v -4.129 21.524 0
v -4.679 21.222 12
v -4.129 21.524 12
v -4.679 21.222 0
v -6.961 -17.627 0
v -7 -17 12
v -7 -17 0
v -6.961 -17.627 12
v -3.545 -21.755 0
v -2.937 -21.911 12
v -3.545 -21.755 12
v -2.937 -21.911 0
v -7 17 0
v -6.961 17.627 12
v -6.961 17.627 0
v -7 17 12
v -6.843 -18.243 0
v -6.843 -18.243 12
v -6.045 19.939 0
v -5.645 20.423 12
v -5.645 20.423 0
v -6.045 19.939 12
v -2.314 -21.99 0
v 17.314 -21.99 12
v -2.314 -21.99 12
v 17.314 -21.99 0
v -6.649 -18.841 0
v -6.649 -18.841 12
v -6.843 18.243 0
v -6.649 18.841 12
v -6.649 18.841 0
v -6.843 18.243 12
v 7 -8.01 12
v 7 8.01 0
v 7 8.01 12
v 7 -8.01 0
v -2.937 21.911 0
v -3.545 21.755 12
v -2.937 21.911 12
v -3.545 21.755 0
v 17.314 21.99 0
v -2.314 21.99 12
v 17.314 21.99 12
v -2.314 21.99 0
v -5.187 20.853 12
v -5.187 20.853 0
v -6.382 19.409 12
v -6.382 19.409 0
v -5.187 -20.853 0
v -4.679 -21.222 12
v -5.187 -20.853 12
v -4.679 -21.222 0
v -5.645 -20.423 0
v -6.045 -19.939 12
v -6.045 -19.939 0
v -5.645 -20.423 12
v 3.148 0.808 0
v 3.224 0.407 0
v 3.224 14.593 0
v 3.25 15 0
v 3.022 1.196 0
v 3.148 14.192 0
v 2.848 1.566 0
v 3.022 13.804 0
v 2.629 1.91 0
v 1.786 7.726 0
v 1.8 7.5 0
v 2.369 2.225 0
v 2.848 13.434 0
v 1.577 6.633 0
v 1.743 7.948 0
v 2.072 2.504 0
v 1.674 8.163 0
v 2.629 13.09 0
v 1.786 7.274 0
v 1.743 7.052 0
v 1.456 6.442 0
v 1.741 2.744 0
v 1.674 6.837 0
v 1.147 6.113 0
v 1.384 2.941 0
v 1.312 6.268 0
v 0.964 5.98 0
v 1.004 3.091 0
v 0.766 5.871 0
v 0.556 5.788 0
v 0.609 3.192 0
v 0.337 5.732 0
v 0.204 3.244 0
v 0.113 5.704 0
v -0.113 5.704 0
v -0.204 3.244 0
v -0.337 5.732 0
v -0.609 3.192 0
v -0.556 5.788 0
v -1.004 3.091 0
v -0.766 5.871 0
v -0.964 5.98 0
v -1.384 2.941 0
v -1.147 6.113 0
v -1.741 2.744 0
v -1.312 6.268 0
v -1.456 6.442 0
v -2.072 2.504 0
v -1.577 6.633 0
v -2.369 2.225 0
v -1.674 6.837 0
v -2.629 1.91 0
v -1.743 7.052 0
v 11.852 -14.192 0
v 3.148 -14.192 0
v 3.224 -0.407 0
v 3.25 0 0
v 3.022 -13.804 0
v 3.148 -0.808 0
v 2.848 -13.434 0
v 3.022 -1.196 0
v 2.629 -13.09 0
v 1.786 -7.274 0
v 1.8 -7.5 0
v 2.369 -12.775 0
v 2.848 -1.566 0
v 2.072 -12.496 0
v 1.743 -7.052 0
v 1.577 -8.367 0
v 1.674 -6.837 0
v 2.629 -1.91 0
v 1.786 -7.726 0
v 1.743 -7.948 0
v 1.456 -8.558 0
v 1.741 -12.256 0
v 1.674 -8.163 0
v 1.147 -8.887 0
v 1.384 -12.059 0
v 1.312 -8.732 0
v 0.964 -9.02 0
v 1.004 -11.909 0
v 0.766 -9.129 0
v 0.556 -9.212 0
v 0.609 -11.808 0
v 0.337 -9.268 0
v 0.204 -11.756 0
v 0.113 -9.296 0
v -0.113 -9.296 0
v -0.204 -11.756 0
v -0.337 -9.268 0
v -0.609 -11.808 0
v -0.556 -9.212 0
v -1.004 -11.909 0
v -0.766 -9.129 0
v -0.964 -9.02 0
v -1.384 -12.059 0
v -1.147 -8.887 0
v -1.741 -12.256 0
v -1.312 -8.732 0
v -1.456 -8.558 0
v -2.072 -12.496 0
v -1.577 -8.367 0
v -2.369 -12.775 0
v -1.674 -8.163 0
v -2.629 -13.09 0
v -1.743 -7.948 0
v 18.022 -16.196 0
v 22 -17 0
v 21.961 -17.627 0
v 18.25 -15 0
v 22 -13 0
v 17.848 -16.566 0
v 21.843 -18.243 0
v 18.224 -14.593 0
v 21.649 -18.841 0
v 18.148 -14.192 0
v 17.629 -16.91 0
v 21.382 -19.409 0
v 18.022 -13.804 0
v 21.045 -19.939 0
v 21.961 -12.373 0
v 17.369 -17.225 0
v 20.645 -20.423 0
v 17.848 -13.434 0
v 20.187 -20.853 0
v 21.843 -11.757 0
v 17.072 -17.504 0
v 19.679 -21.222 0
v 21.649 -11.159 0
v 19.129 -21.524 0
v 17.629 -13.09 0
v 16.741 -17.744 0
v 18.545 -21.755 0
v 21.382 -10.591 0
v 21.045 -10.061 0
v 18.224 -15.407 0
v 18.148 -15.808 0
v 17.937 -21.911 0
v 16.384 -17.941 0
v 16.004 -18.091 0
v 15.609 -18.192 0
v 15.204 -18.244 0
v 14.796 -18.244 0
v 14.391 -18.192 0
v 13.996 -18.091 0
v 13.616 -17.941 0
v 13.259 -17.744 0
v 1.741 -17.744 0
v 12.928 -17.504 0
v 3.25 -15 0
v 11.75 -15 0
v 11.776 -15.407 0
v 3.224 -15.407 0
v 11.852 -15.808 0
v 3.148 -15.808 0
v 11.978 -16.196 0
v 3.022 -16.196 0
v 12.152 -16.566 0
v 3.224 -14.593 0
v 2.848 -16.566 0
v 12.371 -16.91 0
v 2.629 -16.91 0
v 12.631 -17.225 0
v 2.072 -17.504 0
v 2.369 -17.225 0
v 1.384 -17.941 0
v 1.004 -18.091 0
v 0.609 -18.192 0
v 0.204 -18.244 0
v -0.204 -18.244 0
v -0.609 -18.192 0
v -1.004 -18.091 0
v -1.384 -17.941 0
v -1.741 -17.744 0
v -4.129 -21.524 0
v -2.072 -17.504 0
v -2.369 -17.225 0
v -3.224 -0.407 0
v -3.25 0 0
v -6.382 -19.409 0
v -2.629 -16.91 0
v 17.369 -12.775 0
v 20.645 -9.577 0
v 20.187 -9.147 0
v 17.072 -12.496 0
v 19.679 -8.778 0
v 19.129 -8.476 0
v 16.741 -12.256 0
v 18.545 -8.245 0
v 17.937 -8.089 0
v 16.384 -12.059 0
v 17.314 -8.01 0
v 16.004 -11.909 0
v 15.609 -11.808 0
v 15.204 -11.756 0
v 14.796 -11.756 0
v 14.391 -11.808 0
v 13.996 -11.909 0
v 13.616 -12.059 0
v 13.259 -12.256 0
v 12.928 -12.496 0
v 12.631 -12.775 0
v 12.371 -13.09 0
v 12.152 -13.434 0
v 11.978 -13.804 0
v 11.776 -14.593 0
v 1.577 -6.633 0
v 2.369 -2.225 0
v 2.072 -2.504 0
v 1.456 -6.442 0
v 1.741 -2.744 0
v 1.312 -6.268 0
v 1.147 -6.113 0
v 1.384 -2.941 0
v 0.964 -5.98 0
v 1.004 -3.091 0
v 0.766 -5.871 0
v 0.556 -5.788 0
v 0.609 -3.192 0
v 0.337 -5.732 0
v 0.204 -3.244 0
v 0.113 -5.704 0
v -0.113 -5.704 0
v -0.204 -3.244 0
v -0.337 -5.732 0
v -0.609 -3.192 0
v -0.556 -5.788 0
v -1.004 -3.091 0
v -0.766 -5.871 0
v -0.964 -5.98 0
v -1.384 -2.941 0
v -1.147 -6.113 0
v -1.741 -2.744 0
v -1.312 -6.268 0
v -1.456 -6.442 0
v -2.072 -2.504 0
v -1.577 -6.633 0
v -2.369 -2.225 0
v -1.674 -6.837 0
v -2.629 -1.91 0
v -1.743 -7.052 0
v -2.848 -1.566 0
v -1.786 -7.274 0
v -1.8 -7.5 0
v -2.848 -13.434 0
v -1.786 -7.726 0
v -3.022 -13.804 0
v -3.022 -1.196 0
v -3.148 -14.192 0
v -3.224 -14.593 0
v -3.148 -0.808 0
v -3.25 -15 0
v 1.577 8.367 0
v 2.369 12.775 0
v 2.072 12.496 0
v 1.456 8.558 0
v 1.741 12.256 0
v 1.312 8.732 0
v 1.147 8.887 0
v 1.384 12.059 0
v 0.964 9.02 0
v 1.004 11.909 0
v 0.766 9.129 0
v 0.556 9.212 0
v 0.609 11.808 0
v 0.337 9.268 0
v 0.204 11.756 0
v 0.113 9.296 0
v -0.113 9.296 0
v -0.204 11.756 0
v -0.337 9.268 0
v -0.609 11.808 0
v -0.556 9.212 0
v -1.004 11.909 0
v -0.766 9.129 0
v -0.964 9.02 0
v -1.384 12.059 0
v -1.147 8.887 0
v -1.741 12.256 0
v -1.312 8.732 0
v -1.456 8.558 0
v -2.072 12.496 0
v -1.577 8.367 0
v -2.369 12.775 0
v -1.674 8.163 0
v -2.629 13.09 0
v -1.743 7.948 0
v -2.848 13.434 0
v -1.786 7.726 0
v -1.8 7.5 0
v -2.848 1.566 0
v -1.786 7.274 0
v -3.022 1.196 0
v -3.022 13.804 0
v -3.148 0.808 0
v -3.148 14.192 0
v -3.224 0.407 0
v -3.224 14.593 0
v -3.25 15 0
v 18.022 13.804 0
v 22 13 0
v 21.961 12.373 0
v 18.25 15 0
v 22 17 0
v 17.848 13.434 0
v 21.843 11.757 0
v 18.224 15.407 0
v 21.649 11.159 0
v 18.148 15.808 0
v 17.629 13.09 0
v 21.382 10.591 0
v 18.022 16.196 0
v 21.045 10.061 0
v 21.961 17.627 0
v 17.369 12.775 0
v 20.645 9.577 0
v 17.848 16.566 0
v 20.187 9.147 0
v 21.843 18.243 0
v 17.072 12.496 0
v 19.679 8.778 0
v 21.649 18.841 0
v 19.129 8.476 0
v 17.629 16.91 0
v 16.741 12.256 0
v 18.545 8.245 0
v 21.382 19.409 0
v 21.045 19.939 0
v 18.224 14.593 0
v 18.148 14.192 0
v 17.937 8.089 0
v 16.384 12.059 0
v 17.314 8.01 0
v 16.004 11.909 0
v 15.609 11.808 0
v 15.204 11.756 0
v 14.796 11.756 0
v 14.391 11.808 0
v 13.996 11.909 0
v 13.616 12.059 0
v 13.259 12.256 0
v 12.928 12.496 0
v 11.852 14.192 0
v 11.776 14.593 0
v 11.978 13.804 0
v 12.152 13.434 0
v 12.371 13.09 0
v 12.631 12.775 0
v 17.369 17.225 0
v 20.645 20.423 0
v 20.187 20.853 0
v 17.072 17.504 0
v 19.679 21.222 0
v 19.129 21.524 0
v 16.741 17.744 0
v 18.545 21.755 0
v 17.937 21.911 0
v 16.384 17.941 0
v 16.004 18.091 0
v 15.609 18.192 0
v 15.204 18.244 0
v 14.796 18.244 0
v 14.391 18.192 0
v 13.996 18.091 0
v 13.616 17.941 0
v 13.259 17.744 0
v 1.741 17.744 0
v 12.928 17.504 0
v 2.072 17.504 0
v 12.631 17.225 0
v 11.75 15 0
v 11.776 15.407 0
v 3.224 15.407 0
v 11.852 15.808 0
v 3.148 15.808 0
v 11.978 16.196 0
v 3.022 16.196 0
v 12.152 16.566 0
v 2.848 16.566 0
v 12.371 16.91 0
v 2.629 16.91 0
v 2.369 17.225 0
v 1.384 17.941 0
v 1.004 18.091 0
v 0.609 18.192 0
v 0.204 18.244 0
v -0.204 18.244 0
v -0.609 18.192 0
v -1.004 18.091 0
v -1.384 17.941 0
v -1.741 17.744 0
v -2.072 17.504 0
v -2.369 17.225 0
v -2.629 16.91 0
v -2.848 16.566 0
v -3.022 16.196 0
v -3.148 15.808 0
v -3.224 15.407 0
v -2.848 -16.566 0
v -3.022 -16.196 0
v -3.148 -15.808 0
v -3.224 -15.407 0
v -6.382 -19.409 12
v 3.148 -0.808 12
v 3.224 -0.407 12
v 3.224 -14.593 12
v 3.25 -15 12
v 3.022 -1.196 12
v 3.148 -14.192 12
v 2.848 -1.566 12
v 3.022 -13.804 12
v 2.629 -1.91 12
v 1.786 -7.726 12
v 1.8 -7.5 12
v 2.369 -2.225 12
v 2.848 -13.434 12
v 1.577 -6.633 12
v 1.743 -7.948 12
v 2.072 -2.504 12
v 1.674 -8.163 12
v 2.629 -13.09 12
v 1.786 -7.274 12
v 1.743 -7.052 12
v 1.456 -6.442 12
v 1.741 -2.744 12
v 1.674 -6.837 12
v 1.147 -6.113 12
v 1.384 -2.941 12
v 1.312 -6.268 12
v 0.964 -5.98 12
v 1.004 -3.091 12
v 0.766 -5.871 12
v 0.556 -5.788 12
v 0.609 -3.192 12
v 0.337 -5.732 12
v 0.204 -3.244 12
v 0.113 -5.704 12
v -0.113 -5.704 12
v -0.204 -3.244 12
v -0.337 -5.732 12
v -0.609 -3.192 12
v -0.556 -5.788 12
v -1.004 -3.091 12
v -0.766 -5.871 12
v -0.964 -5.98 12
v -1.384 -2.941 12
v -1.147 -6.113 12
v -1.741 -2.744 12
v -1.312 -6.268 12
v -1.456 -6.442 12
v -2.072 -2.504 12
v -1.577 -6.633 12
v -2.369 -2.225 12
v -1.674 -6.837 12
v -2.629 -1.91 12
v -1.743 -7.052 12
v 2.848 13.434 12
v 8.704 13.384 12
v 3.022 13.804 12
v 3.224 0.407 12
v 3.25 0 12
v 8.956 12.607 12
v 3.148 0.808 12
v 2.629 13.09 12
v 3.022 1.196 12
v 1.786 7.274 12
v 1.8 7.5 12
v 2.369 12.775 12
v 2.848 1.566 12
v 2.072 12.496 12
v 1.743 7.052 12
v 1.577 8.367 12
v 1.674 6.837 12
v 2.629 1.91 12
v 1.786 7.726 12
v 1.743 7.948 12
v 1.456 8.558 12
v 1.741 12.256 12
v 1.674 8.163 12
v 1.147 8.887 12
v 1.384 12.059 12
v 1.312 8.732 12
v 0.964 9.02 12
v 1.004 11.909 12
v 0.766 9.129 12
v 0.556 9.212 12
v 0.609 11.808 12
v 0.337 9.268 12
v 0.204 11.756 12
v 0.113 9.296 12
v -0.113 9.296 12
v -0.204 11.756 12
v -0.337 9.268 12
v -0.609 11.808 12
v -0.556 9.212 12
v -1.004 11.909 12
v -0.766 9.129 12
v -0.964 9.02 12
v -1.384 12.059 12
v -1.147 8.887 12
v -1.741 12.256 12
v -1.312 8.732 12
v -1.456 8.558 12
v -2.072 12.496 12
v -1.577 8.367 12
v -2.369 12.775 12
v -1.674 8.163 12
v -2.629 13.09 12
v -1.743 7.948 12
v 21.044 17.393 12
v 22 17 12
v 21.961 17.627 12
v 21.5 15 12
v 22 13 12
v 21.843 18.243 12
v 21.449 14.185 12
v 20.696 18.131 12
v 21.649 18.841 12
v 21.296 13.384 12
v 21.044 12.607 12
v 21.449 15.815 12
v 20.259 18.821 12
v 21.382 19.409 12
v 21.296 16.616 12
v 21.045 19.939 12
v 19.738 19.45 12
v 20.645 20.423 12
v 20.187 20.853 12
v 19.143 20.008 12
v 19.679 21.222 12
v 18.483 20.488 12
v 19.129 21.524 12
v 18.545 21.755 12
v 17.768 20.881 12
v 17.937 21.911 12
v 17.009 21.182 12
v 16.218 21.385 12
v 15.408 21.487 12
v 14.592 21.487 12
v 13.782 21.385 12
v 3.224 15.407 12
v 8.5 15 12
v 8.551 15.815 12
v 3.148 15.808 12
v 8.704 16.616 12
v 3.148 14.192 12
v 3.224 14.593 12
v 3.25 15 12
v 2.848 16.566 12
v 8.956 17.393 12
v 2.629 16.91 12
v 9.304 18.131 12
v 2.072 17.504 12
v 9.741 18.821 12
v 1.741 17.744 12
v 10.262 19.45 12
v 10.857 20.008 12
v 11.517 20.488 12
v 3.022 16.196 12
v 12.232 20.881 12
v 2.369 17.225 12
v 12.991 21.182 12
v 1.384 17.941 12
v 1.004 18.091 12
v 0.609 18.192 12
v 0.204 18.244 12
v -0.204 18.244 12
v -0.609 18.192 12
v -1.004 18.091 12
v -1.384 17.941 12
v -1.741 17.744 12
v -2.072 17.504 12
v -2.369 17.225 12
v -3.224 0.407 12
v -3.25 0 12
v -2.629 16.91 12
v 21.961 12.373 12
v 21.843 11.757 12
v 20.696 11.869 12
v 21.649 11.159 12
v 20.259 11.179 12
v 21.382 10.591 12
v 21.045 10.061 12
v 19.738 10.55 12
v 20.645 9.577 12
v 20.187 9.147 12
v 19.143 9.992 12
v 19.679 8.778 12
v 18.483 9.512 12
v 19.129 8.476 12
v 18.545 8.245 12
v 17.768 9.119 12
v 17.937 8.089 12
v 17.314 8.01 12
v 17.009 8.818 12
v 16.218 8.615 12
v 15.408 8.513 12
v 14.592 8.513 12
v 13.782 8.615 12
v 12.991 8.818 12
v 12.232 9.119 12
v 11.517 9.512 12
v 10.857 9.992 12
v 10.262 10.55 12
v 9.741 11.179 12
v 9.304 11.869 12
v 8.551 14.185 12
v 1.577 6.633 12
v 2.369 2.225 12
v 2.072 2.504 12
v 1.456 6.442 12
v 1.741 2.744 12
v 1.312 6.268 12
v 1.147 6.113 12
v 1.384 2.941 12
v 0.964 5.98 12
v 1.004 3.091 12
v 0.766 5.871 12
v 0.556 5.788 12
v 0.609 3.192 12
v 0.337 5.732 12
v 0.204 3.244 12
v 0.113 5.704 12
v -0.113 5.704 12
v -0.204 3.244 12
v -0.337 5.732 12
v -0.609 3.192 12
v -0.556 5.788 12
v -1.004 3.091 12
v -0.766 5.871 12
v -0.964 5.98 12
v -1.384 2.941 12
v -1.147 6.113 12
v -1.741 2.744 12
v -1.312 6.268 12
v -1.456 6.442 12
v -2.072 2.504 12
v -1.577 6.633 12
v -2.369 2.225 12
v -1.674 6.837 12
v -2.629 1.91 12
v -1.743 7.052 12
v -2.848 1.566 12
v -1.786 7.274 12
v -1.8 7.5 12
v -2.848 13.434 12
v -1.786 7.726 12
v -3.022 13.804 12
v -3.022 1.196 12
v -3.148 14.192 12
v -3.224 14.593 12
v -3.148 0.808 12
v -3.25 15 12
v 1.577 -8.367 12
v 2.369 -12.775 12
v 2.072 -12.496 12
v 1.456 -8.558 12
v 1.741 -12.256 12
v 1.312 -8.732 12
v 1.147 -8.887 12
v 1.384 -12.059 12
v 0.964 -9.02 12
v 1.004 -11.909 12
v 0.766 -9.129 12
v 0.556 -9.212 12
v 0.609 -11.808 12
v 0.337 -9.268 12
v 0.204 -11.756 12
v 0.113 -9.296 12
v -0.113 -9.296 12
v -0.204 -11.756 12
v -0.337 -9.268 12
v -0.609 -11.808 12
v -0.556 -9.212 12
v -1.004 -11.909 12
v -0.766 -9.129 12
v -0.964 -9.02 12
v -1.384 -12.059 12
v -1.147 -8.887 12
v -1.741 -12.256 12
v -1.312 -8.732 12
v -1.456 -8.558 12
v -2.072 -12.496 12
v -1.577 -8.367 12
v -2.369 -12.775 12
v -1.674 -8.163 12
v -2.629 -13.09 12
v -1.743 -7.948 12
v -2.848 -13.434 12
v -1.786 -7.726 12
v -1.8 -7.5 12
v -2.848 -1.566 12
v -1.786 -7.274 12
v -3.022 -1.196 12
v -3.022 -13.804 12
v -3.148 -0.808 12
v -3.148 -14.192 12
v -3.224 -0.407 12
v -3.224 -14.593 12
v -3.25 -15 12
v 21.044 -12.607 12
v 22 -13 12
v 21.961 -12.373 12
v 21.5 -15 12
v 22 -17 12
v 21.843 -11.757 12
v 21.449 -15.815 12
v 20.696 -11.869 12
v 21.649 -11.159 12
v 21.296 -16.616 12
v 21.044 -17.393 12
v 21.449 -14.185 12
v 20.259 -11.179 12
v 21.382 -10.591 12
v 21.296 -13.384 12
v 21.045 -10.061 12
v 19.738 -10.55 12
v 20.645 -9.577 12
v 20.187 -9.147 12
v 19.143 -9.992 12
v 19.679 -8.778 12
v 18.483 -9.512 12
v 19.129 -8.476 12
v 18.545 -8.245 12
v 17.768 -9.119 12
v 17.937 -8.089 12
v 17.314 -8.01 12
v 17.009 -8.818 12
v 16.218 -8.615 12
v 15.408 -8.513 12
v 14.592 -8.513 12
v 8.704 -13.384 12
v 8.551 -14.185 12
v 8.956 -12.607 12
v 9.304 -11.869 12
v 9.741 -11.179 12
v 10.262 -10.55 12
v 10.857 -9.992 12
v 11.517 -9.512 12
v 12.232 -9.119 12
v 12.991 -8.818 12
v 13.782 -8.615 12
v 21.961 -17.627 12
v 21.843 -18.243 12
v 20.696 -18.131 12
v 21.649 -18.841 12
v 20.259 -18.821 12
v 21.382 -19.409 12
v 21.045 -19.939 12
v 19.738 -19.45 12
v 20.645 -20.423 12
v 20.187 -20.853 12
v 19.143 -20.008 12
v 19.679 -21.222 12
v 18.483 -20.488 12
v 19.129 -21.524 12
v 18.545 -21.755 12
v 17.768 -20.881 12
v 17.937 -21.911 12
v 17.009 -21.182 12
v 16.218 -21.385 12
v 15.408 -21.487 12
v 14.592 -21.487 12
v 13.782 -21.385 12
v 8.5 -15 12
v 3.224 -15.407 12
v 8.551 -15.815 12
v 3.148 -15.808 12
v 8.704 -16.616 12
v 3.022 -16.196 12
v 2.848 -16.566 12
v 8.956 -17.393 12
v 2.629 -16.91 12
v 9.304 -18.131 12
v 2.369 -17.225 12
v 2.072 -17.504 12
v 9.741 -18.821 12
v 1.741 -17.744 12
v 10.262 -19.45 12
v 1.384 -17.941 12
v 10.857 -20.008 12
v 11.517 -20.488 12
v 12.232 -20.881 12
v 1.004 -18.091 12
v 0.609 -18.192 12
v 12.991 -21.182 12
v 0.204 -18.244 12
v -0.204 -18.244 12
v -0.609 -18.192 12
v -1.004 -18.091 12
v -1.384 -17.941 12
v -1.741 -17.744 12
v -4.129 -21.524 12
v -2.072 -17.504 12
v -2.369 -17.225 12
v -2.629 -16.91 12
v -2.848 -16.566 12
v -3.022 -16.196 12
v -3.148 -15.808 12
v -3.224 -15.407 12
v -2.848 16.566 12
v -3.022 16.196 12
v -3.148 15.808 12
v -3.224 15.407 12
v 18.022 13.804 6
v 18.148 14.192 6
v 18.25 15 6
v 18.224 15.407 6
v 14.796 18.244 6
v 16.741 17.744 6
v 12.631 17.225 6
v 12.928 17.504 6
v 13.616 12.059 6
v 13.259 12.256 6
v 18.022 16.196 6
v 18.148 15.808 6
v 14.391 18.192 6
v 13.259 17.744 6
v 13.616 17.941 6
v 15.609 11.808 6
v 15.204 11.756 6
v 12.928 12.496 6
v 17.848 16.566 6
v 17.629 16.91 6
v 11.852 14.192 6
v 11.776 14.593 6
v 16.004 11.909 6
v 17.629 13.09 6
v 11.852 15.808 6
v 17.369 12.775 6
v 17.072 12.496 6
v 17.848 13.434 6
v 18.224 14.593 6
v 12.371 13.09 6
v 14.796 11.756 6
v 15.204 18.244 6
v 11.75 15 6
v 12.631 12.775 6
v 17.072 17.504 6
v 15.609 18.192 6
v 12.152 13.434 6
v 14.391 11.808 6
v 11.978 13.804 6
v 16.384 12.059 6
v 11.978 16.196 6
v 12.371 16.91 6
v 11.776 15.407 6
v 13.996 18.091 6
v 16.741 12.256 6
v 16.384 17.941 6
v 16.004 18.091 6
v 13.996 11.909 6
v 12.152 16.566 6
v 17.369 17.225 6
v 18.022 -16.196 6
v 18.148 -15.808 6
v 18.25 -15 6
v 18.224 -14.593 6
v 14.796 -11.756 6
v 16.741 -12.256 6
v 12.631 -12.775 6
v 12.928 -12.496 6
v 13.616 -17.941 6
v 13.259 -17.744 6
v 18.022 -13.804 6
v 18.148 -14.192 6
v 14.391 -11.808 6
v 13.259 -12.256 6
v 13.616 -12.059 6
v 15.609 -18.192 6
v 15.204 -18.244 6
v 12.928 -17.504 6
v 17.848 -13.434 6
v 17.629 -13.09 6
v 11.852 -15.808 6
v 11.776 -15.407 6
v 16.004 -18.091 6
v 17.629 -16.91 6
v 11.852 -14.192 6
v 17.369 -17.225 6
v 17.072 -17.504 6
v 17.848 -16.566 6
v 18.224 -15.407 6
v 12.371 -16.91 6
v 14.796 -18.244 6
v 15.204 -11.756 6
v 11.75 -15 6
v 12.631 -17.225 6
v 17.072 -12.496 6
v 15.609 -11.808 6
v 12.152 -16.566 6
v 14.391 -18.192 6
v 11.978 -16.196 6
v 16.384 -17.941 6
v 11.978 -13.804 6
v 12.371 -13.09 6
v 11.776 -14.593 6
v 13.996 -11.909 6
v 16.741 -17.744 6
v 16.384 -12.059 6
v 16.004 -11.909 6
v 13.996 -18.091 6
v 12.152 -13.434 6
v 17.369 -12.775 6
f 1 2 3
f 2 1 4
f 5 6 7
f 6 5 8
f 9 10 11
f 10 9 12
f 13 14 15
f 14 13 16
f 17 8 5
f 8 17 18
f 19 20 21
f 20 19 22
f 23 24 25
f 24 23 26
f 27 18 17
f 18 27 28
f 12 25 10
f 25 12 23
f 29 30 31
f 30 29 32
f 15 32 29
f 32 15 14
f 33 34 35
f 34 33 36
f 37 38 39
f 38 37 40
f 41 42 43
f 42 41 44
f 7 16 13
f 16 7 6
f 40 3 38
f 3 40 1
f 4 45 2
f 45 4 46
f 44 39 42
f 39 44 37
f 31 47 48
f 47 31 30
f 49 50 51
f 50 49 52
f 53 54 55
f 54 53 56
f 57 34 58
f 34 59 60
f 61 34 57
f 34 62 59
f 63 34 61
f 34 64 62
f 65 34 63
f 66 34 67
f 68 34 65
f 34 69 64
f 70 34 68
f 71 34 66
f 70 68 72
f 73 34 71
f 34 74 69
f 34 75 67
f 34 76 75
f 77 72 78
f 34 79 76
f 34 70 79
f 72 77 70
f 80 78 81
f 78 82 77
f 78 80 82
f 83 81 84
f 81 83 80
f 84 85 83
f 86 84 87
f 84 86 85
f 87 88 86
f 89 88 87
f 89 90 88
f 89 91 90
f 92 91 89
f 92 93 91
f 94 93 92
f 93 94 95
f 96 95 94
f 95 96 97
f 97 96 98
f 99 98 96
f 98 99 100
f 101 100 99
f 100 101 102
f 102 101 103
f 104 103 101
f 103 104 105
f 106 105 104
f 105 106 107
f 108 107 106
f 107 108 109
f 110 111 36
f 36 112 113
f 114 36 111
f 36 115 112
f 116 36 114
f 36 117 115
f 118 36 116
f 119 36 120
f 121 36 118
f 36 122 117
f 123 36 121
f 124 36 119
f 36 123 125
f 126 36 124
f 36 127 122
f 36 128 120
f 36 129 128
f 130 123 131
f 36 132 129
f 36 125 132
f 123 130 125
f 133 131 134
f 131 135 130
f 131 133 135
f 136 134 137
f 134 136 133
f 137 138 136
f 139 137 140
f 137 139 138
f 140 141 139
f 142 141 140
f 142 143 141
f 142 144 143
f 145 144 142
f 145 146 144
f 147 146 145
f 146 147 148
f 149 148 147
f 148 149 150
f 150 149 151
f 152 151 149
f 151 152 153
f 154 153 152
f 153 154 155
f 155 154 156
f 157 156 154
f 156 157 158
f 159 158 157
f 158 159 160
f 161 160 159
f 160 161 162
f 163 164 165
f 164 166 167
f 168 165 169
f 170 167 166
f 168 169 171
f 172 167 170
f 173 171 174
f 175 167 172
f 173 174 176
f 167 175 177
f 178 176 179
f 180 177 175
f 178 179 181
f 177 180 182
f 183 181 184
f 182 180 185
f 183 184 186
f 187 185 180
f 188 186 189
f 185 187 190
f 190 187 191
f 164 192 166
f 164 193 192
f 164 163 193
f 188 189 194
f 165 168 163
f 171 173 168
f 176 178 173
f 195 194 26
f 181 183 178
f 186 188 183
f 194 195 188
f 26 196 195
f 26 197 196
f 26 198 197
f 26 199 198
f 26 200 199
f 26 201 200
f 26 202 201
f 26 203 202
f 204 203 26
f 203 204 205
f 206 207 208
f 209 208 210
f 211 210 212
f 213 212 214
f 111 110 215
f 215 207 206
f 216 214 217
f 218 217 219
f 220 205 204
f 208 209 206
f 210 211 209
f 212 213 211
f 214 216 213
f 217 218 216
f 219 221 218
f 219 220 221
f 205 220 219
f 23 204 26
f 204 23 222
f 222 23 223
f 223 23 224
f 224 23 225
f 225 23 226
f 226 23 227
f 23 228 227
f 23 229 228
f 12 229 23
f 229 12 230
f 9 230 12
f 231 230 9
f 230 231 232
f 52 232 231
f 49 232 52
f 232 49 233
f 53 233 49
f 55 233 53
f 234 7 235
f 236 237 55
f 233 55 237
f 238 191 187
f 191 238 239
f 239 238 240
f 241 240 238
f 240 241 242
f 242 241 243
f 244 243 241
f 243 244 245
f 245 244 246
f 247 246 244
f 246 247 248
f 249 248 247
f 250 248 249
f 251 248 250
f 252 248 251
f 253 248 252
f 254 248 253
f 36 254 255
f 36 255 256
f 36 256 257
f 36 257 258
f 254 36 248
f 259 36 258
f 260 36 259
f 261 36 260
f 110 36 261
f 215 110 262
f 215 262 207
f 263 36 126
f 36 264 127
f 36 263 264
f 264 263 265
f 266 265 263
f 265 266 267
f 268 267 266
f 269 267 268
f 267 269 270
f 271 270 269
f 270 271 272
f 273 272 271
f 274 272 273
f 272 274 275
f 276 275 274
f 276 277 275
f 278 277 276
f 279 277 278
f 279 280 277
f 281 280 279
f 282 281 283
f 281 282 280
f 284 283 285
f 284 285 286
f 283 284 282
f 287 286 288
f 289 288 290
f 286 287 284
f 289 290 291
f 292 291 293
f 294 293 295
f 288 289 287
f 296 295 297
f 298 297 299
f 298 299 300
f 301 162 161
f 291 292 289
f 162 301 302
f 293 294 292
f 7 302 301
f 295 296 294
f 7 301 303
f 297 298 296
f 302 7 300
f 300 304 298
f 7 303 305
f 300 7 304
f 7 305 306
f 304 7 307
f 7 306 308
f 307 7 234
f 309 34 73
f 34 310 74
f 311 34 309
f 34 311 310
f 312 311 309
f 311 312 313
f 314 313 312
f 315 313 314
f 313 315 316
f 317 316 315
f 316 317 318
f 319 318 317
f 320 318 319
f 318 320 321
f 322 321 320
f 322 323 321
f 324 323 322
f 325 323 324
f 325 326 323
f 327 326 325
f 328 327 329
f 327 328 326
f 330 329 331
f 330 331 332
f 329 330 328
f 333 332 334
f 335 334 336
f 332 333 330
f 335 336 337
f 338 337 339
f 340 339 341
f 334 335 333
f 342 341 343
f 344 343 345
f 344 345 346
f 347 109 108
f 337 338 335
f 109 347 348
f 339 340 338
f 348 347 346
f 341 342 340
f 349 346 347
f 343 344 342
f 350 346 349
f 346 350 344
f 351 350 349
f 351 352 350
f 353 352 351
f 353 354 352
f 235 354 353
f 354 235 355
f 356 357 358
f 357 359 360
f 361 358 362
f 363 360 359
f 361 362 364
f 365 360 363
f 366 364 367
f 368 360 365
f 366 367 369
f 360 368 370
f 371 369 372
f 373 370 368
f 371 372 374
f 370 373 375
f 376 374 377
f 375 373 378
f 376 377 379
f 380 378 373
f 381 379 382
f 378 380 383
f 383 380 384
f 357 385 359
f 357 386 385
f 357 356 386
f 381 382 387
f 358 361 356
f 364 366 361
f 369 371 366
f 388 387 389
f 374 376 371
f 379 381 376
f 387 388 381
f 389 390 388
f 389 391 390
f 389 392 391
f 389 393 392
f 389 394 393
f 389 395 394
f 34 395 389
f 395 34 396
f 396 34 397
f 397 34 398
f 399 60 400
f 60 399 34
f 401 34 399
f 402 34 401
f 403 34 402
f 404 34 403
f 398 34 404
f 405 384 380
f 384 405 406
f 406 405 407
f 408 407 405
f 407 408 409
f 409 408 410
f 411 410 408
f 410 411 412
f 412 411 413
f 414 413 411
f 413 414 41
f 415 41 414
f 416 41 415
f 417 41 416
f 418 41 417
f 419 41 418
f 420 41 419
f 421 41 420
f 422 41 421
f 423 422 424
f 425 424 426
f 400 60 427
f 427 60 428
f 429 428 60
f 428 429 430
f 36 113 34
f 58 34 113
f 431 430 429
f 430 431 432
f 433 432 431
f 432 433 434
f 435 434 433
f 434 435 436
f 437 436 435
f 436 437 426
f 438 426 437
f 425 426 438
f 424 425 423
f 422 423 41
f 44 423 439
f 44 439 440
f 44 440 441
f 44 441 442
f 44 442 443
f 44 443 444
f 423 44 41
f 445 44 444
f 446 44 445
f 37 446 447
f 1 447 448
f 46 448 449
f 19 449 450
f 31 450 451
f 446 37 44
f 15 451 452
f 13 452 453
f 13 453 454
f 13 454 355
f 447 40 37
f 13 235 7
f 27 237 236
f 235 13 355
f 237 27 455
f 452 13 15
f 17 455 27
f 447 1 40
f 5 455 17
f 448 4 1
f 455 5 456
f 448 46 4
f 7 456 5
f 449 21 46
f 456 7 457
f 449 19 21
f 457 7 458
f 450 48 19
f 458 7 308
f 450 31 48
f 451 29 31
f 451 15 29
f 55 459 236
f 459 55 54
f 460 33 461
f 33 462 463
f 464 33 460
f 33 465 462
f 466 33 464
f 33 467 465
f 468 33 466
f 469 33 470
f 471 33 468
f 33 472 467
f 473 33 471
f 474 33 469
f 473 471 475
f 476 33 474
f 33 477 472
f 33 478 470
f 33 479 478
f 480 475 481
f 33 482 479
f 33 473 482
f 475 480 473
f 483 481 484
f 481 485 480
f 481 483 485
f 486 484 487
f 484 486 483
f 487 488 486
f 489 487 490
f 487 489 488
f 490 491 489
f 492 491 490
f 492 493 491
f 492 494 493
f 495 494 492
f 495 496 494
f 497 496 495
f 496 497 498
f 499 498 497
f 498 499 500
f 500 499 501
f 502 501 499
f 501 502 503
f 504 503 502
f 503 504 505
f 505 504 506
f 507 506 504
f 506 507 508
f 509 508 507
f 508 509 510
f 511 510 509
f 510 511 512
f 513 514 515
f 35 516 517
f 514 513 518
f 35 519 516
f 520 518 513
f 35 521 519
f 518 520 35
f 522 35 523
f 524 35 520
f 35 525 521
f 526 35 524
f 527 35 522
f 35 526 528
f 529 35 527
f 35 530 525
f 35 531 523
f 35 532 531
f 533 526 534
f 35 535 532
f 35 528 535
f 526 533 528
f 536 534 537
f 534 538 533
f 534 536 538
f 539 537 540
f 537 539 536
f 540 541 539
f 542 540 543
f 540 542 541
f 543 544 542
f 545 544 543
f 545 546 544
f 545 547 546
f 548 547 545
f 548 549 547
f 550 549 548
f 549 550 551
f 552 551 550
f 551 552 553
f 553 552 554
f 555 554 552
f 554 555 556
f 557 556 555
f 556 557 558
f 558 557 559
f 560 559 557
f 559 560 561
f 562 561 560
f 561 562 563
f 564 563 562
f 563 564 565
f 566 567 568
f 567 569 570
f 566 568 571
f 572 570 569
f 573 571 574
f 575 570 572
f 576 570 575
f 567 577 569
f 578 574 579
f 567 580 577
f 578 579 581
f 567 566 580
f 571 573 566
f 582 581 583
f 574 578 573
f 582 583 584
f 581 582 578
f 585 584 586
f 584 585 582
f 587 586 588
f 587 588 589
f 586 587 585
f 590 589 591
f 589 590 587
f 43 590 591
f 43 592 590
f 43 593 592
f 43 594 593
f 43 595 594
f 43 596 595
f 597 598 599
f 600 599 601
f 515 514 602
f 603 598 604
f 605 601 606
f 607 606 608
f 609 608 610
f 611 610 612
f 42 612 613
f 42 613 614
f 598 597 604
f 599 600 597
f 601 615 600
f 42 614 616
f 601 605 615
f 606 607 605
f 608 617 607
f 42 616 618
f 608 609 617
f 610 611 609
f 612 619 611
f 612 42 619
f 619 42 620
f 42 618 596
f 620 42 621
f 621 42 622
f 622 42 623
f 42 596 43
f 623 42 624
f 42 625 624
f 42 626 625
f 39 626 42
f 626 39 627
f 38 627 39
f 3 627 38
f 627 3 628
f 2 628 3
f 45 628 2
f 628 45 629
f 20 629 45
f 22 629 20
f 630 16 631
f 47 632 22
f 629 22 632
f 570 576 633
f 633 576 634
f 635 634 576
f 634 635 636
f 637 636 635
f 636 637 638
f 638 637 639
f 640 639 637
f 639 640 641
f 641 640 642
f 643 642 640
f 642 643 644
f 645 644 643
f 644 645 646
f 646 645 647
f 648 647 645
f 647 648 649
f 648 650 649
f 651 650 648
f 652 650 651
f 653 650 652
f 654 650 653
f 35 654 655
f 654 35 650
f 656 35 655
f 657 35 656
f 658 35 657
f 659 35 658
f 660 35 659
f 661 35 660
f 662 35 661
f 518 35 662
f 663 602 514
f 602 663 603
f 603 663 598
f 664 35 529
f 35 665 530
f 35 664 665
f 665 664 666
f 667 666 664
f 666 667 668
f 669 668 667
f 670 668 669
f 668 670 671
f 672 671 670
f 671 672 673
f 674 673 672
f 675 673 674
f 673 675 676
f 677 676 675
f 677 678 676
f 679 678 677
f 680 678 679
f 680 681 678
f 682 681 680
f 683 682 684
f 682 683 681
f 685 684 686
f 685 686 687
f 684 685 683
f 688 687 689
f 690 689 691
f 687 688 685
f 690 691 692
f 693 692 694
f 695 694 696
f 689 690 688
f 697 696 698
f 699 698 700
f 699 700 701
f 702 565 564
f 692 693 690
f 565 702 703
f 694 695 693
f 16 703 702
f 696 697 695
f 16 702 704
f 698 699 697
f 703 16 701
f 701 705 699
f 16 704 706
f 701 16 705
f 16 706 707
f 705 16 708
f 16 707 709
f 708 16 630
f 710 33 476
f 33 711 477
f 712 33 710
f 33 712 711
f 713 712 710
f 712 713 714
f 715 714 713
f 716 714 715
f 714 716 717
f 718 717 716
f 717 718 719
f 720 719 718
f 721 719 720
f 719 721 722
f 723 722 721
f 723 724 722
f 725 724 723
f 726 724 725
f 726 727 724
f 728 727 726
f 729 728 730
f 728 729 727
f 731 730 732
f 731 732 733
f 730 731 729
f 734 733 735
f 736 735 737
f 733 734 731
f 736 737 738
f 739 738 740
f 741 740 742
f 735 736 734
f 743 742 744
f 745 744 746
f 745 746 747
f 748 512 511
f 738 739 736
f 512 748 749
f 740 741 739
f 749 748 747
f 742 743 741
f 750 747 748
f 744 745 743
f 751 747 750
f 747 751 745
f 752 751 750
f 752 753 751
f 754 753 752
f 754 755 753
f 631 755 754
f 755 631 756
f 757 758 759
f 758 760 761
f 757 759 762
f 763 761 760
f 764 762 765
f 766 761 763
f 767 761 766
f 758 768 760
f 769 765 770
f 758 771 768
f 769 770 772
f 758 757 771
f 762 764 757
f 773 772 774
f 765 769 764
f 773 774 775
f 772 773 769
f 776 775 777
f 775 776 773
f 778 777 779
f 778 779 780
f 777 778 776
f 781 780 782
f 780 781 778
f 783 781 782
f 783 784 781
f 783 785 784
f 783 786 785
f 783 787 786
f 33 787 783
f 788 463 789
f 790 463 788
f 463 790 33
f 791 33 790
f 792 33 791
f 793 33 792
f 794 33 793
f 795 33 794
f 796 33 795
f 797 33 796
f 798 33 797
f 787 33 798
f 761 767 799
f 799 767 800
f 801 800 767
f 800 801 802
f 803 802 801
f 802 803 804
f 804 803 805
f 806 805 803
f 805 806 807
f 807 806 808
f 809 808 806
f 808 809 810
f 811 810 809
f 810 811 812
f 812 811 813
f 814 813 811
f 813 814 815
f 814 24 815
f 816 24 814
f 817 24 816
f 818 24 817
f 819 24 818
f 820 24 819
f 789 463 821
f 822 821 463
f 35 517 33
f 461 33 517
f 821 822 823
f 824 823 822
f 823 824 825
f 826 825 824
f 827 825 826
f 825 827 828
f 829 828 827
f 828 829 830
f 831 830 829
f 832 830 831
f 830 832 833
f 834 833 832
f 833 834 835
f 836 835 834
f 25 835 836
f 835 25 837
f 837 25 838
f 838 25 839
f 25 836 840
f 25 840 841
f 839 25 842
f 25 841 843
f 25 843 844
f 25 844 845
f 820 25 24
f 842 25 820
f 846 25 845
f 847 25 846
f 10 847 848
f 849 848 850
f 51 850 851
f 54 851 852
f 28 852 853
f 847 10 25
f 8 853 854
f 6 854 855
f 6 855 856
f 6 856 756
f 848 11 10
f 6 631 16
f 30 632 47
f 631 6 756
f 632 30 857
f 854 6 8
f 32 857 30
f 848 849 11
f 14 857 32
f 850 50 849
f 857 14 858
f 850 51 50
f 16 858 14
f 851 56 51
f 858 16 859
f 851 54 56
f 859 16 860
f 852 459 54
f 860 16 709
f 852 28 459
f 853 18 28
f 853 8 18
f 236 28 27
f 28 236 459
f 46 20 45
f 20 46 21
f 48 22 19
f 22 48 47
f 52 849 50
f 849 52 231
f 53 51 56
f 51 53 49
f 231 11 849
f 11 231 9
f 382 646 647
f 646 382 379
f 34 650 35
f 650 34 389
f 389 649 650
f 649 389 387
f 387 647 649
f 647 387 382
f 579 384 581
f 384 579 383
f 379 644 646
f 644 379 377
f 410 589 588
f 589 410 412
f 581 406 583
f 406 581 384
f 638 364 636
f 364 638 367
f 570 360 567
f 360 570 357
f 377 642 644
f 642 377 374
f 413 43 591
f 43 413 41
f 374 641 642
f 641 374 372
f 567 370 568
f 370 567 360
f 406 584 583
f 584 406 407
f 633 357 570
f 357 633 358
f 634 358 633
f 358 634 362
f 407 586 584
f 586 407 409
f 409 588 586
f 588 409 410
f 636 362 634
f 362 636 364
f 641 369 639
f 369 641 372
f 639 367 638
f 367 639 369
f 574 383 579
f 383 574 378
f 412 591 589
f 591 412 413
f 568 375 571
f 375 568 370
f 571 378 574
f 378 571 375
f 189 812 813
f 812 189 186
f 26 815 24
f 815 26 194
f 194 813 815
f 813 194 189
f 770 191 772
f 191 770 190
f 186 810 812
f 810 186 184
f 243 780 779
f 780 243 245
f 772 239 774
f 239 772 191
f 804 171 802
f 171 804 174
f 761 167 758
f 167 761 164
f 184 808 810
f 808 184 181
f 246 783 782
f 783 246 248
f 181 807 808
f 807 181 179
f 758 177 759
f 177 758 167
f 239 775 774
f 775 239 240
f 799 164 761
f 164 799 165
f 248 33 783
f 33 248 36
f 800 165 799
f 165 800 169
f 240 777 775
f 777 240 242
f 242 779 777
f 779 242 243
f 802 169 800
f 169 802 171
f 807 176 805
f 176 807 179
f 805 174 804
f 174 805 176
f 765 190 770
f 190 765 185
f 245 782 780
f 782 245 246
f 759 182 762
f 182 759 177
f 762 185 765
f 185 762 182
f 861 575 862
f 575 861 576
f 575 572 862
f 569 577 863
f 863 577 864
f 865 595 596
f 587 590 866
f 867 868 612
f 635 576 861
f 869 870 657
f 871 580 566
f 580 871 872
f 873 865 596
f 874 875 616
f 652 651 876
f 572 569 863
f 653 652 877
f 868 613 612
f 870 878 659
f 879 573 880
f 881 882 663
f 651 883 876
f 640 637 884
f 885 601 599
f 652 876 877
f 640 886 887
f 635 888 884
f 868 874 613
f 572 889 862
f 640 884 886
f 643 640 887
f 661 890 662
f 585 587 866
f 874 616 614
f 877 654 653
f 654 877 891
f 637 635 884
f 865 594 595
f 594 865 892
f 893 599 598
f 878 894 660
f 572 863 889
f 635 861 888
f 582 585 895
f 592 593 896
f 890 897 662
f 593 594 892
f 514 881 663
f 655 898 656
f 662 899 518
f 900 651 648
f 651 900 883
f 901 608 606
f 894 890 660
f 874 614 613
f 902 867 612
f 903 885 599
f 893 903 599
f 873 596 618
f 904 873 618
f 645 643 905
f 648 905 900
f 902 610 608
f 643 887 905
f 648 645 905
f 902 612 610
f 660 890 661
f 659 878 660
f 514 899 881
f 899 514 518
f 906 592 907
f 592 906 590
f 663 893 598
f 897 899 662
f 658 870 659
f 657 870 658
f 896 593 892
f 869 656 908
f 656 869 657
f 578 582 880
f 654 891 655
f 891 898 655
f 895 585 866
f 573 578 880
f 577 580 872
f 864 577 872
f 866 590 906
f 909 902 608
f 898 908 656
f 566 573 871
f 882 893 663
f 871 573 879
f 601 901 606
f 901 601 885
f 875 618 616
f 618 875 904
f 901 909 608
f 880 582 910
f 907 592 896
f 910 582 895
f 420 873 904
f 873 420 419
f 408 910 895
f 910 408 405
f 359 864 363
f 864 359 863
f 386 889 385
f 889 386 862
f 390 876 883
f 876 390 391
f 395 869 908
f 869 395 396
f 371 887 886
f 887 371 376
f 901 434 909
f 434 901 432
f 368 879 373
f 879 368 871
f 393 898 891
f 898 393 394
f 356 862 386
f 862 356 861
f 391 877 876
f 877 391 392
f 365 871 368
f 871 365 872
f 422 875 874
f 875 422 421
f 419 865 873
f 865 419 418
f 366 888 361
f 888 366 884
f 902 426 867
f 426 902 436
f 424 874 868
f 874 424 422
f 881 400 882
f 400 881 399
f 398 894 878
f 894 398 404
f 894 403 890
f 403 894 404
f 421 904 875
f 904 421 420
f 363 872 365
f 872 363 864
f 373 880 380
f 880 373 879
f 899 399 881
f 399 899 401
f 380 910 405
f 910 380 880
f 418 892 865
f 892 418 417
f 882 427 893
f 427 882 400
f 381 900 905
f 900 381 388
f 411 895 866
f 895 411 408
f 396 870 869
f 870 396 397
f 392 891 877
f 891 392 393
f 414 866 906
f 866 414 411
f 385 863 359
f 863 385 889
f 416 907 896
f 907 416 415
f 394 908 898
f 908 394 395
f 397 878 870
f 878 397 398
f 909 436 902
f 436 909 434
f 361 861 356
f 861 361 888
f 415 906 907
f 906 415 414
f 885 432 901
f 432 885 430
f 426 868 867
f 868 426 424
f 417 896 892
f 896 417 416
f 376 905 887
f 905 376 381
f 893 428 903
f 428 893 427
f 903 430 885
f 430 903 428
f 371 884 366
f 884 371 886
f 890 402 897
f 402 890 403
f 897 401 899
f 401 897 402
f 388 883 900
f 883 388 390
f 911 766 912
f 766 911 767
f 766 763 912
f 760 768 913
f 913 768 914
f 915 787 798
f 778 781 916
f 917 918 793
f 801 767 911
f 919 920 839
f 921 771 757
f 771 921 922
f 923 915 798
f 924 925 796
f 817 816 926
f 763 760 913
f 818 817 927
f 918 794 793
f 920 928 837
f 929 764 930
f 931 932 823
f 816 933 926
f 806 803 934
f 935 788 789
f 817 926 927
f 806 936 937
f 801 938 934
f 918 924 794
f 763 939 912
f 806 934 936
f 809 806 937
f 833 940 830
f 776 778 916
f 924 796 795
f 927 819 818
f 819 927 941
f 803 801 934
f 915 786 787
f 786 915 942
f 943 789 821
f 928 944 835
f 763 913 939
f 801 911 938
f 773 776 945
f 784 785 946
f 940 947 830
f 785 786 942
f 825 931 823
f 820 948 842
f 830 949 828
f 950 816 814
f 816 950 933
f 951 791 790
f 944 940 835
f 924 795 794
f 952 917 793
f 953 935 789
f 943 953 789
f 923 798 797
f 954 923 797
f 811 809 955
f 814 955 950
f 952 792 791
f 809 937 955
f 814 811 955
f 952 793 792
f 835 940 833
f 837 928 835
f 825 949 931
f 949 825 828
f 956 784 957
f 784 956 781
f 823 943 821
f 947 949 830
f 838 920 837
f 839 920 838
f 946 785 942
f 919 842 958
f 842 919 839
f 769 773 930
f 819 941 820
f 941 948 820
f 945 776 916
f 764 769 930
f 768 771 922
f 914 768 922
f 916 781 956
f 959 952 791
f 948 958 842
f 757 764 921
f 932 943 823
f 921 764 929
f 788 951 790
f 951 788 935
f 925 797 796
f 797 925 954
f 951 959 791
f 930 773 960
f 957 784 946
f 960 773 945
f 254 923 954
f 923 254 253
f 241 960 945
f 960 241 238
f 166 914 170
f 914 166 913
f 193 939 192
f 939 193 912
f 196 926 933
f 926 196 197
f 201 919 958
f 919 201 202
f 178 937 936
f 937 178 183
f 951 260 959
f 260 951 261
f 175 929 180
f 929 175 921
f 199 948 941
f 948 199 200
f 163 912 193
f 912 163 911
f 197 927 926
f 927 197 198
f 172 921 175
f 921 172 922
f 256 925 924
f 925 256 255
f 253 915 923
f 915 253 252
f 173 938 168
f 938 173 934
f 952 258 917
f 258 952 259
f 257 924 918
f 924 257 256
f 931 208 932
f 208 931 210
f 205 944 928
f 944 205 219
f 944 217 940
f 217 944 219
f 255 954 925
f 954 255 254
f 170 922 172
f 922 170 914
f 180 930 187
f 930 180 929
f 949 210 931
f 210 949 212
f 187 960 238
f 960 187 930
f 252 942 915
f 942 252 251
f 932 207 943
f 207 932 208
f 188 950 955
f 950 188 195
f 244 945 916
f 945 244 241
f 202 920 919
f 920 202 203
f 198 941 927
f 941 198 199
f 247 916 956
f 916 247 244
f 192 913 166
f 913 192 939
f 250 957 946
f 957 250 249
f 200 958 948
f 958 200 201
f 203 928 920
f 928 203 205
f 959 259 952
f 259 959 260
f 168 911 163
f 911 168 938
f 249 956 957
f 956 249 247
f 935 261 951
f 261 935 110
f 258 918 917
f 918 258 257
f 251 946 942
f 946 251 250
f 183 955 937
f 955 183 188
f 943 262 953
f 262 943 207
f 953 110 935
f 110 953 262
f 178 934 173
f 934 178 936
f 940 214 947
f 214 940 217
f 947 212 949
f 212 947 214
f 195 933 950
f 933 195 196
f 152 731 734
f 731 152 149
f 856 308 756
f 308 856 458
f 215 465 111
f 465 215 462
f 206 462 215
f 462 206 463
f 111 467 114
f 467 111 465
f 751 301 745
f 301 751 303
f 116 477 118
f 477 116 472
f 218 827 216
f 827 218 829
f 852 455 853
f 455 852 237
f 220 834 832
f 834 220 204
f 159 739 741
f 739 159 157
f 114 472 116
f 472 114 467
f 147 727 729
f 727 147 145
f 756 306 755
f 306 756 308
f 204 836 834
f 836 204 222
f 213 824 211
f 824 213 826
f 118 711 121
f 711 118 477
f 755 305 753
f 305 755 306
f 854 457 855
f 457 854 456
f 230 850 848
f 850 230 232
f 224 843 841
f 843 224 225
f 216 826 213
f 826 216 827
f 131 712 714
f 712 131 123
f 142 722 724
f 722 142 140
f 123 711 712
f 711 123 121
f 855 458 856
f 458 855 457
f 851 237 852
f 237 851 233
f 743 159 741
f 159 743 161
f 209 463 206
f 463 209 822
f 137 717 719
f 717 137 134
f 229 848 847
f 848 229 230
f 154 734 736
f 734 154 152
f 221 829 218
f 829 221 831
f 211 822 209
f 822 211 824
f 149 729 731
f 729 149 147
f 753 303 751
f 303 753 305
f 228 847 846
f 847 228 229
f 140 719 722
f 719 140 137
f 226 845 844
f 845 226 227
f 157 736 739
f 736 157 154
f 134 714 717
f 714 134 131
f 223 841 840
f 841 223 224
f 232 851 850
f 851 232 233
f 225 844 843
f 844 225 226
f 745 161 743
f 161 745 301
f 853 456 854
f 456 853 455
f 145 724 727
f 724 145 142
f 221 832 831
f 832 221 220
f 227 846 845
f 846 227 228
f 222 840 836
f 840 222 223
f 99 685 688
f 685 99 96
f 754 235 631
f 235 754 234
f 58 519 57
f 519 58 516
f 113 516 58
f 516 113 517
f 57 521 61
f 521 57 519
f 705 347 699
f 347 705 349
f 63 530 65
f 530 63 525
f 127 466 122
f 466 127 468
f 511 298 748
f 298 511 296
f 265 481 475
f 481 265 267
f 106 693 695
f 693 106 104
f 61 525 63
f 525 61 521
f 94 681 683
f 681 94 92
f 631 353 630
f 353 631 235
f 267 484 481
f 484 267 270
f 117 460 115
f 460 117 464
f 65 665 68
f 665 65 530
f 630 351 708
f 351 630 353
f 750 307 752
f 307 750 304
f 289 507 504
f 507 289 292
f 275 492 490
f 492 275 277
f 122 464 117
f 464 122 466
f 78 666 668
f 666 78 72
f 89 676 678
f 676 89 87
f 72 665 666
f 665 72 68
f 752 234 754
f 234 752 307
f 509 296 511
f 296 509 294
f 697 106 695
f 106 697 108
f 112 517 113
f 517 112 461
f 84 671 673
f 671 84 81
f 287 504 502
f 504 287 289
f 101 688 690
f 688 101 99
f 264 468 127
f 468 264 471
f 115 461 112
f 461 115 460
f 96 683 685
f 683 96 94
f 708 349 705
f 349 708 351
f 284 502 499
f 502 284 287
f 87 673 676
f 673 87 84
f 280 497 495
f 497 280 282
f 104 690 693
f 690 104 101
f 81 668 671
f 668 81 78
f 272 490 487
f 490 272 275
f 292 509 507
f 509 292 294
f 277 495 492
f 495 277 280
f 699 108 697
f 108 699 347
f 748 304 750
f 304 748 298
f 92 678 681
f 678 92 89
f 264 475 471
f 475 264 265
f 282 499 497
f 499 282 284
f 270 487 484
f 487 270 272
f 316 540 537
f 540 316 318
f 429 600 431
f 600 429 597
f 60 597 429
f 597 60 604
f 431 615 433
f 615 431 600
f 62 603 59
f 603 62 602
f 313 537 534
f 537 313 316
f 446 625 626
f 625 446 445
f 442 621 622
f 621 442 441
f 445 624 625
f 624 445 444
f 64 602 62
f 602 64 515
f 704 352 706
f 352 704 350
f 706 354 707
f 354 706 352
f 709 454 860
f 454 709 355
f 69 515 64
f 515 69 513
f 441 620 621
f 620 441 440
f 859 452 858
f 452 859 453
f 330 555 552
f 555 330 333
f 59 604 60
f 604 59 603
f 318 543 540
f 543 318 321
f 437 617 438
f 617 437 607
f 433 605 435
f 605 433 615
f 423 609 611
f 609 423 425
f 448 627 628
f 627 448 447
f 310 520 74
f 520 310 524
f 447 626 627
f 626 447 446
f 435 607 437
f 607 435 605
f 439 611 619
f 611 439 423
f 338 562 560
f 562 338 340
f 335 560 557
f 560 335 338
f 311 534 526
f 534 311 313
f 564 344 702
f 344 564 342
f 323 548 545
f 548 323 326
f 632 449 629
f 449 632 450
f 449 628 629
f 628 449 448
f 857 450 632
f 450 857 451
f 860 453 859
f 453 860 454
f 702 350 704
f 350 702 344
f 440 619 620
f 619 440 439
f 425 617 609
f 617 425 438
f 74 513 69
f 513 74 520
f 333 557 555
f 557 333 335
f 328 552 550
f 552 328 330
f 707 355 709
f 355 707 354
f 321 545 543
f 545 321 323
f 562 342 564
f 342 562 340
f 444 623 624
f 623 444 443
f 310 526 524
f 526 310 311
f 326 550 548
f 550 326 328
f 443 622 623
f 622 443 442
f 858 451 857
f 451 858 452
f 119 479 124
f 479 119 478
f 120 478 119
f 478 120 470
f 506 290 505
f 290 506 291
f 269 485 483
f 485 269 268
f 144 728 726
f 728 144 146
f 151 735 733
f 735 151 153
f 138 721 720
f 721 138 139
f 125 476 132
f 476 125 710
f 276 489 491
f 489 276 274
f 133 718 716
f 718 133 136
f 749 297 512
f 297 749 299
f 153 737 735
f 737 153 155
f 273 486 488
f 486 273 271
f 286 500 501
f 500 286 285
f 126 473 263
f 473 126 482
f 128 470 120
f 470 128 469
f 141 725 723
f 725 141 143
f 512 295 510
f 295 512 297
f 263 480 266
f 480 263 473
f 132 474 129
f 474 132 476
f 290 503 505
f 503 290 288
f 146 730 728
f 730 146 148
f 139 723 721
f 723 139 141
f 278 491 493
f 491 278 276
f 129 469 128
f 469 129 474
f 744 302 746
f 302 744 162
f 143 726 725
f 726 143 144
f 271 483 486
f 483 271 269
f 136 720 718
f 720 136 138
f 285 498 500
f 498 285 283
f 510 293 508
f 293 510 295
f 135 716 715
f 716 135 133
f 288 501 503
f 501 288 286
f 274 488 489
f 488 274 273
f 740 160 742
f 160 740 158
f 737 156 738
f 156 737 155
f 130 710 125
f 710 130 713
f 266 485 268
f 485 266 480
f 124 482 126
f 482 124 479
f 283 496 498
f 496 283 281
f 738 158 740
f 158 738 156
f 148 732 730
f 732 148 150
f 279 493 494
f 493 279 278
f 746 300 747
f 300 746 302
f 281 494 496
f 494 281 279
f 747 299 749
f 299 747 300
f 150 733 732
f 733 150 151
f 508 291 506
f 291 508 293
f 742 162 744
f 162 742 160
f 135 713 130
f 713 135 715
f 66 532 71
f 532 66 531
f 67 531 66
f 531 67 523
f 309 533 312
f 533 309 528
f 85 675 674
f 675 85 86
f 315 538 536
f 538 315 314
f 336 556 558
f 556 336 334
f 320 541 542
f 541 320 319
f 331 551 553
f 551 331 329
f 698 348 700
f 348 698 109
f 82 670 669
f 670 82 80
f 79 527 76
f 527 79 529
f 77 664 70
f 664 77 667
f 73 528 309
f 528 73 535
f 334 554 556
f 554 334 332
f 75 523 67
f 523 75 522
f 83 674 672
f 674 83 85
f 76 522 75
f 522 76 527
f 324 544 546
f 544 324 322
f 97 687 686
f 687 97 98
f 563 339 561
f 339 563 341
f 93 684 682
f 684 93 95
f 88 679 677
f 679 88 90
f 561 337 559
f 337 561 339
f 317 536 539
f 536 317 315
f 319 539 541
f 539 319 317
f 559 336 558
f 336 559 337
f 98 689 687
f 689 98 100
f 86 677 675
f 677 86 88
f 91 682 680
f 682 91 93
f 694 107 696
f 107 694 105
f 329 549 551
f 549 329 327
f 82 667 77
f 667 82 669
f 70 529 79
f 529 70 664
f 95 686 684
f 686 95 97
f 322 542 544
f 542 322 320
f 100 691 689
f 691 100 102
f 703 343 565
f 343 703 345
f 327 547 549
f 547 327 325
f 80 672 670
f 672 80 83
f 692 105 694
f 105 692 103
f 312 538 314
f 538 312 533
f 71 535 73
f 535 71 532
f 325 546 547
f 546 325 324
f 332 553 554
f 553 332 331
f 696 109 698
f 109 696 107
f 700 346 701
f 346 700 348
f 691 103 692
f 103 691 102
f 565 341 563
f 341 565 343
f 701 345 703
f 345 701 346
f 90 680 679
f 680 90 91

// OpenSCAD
$fn = 50;


difference() {
	union() {
		hull() {
			translate(v = [-2.0000000000, 17.0000000000, 0]) {
				cylinder(h = 12, r = 5);
			}
			translate(v = [2.0000000000, 17.0000000000, 0]) {
				cylinder(h = 12, r = 5);
			}
			translate(v = [-2.0000000000, -17.0000000000, 0]) {
				cylinder(h = 12, r = 5);
			}
			translate(v = [2.0000000000, -17.0000000000, 0]) {
				cylinder(h = 12, r = 5);
			}
		}
		translate(v = [7.5000000000, 15.0000000000, 0]) {
			hull() {
				translate(v = [-9.5000000000, 2.0000000000, 0]) {
					cylinder(h = 12, r = 5);
				}
				translate(v = [9.5000000000, 2.0000000000, 0]) {
					cylinder(h = 12, r = 5);
				}
				translate(v = [-9.5000000000, -2.0000000000, 0]) {
					cylinder(h = 12, r = 5);
				}
				translate(v = [9.5000000000, -2.0000000000, 0]) {
					cylinder(h = 12, r = 5);
				}
			}
		}
		translate(v = [7.5000000000, -15.0000000000, 0]) {
			hull() {
				translate(v = [-9.5000000000, 2.0000000000, 0]) {
					cylinder(h = 12, r = 5);
				}
				translate(v = [9.5000000000, 2.0000000000, 0]) {
					cylinder(h = 12, r = 5);
				}
				translate(v = [-9.5000000000, -2.0000000000, 0]) {
					cylinder(h = 12, r = 5);
				}
				translate(v = [9.5000000000, -2.0000000000, 0]) {
					cylinder(h = 12, r = 5);
				}
			}
		}
	}
	union() {
		translate(v = [15.0000000000, 15.0000000000, 12]) {
			rotate(a = [0, 0, 0]) {
				difference() {
					union() {
						#translate(v = [0, 0, -12.0000000000]) {
							cylinder(h = 12, r = 2.2500000000);
						}
						#translate(v = [0, 0, -6]) {
							cylinder(h = 6, r1 = 3.2500000000, r2 = 6.5000000000);
						}
						#translate(v = [0, 0, -12.0000000000]) {
							cylinder(h = 12, r = 3.2500000000);
						}
						#translate(v = [0, 0, -12.0000000000]) {
							cylinder(h = 12, r = 2.2500000000);
						}
					}
					union();
				}
			}
		}
		translate(v = [15.0000000000, -15.0000000000, 12]) {
			rotate(a = [0, 0, 0]) {
				difference() {
					union() {
						#translate(v = [0, 0, -12.0000000000]) {
							cylinder(h = 12, r = 2.2500000000);
						}
						#translate(v = [0, 0, -6]) {
							cylinder(h = 6, r1 = 3.2500000000, r2 = 6.5000000000);
						}
						#translate(v = [0, 0, -12.0000000000]) {
							cylinder(h = 12, r = 3.2500000000);
						}
						#translate(v = [0, 0, -12.0000000000]) {
							cylinder(h = 12, r = 2.2500000000);
						}
					}
					union();
				}
			}
		}
		translate(v = [0.0000000000, -15.0000000000, 0]) {
			translate(v = [0, 0, -100]) {
				cylinder(h = 200, r = 3.2500000000);
			}
		}
		translate(v = [0, 0, -100]) {
			cylinder(h = 200, r = 3.2500000000);
		}
		translate(v = [0.0000000000, 15.0000000000, 0]) {
			translate(v = [0, 0, -100]) {
				cylinder(h = 200, r = 3.2500000000);
			}
		}
		translate(v = [0.0000000000, -15.0000000000, 0]) {
			translate(v = [0, 0, -100]) {
				cylinder(h = 200, r = 1.8000000000);
			}
		}
		translate(v = [0.0000000000, -7.5000000000, 0]) {
			translate(v = [0, 0, -100]) {
				cylinder(h = 200, r = 1.8000000000);
			}
		}
		translate(v = [0, 0, -100]) {
			cylinder(h = 200, r = 1.8000000000);
		}
		translate(v = [0.0000000000, 7.5000000000, 0]) {
			translate(v = [0, 0, -100]) {
				cylinder(h = 200, r = 1.8000000000);
			}
		}
		translate(v = [0.0000000000, 15.0000000000, 0]) {
			translate(v = [0, 0, -100]) {
				cylinder(h = 200, r = 1.8000000000);
			}
		}
	}
}
